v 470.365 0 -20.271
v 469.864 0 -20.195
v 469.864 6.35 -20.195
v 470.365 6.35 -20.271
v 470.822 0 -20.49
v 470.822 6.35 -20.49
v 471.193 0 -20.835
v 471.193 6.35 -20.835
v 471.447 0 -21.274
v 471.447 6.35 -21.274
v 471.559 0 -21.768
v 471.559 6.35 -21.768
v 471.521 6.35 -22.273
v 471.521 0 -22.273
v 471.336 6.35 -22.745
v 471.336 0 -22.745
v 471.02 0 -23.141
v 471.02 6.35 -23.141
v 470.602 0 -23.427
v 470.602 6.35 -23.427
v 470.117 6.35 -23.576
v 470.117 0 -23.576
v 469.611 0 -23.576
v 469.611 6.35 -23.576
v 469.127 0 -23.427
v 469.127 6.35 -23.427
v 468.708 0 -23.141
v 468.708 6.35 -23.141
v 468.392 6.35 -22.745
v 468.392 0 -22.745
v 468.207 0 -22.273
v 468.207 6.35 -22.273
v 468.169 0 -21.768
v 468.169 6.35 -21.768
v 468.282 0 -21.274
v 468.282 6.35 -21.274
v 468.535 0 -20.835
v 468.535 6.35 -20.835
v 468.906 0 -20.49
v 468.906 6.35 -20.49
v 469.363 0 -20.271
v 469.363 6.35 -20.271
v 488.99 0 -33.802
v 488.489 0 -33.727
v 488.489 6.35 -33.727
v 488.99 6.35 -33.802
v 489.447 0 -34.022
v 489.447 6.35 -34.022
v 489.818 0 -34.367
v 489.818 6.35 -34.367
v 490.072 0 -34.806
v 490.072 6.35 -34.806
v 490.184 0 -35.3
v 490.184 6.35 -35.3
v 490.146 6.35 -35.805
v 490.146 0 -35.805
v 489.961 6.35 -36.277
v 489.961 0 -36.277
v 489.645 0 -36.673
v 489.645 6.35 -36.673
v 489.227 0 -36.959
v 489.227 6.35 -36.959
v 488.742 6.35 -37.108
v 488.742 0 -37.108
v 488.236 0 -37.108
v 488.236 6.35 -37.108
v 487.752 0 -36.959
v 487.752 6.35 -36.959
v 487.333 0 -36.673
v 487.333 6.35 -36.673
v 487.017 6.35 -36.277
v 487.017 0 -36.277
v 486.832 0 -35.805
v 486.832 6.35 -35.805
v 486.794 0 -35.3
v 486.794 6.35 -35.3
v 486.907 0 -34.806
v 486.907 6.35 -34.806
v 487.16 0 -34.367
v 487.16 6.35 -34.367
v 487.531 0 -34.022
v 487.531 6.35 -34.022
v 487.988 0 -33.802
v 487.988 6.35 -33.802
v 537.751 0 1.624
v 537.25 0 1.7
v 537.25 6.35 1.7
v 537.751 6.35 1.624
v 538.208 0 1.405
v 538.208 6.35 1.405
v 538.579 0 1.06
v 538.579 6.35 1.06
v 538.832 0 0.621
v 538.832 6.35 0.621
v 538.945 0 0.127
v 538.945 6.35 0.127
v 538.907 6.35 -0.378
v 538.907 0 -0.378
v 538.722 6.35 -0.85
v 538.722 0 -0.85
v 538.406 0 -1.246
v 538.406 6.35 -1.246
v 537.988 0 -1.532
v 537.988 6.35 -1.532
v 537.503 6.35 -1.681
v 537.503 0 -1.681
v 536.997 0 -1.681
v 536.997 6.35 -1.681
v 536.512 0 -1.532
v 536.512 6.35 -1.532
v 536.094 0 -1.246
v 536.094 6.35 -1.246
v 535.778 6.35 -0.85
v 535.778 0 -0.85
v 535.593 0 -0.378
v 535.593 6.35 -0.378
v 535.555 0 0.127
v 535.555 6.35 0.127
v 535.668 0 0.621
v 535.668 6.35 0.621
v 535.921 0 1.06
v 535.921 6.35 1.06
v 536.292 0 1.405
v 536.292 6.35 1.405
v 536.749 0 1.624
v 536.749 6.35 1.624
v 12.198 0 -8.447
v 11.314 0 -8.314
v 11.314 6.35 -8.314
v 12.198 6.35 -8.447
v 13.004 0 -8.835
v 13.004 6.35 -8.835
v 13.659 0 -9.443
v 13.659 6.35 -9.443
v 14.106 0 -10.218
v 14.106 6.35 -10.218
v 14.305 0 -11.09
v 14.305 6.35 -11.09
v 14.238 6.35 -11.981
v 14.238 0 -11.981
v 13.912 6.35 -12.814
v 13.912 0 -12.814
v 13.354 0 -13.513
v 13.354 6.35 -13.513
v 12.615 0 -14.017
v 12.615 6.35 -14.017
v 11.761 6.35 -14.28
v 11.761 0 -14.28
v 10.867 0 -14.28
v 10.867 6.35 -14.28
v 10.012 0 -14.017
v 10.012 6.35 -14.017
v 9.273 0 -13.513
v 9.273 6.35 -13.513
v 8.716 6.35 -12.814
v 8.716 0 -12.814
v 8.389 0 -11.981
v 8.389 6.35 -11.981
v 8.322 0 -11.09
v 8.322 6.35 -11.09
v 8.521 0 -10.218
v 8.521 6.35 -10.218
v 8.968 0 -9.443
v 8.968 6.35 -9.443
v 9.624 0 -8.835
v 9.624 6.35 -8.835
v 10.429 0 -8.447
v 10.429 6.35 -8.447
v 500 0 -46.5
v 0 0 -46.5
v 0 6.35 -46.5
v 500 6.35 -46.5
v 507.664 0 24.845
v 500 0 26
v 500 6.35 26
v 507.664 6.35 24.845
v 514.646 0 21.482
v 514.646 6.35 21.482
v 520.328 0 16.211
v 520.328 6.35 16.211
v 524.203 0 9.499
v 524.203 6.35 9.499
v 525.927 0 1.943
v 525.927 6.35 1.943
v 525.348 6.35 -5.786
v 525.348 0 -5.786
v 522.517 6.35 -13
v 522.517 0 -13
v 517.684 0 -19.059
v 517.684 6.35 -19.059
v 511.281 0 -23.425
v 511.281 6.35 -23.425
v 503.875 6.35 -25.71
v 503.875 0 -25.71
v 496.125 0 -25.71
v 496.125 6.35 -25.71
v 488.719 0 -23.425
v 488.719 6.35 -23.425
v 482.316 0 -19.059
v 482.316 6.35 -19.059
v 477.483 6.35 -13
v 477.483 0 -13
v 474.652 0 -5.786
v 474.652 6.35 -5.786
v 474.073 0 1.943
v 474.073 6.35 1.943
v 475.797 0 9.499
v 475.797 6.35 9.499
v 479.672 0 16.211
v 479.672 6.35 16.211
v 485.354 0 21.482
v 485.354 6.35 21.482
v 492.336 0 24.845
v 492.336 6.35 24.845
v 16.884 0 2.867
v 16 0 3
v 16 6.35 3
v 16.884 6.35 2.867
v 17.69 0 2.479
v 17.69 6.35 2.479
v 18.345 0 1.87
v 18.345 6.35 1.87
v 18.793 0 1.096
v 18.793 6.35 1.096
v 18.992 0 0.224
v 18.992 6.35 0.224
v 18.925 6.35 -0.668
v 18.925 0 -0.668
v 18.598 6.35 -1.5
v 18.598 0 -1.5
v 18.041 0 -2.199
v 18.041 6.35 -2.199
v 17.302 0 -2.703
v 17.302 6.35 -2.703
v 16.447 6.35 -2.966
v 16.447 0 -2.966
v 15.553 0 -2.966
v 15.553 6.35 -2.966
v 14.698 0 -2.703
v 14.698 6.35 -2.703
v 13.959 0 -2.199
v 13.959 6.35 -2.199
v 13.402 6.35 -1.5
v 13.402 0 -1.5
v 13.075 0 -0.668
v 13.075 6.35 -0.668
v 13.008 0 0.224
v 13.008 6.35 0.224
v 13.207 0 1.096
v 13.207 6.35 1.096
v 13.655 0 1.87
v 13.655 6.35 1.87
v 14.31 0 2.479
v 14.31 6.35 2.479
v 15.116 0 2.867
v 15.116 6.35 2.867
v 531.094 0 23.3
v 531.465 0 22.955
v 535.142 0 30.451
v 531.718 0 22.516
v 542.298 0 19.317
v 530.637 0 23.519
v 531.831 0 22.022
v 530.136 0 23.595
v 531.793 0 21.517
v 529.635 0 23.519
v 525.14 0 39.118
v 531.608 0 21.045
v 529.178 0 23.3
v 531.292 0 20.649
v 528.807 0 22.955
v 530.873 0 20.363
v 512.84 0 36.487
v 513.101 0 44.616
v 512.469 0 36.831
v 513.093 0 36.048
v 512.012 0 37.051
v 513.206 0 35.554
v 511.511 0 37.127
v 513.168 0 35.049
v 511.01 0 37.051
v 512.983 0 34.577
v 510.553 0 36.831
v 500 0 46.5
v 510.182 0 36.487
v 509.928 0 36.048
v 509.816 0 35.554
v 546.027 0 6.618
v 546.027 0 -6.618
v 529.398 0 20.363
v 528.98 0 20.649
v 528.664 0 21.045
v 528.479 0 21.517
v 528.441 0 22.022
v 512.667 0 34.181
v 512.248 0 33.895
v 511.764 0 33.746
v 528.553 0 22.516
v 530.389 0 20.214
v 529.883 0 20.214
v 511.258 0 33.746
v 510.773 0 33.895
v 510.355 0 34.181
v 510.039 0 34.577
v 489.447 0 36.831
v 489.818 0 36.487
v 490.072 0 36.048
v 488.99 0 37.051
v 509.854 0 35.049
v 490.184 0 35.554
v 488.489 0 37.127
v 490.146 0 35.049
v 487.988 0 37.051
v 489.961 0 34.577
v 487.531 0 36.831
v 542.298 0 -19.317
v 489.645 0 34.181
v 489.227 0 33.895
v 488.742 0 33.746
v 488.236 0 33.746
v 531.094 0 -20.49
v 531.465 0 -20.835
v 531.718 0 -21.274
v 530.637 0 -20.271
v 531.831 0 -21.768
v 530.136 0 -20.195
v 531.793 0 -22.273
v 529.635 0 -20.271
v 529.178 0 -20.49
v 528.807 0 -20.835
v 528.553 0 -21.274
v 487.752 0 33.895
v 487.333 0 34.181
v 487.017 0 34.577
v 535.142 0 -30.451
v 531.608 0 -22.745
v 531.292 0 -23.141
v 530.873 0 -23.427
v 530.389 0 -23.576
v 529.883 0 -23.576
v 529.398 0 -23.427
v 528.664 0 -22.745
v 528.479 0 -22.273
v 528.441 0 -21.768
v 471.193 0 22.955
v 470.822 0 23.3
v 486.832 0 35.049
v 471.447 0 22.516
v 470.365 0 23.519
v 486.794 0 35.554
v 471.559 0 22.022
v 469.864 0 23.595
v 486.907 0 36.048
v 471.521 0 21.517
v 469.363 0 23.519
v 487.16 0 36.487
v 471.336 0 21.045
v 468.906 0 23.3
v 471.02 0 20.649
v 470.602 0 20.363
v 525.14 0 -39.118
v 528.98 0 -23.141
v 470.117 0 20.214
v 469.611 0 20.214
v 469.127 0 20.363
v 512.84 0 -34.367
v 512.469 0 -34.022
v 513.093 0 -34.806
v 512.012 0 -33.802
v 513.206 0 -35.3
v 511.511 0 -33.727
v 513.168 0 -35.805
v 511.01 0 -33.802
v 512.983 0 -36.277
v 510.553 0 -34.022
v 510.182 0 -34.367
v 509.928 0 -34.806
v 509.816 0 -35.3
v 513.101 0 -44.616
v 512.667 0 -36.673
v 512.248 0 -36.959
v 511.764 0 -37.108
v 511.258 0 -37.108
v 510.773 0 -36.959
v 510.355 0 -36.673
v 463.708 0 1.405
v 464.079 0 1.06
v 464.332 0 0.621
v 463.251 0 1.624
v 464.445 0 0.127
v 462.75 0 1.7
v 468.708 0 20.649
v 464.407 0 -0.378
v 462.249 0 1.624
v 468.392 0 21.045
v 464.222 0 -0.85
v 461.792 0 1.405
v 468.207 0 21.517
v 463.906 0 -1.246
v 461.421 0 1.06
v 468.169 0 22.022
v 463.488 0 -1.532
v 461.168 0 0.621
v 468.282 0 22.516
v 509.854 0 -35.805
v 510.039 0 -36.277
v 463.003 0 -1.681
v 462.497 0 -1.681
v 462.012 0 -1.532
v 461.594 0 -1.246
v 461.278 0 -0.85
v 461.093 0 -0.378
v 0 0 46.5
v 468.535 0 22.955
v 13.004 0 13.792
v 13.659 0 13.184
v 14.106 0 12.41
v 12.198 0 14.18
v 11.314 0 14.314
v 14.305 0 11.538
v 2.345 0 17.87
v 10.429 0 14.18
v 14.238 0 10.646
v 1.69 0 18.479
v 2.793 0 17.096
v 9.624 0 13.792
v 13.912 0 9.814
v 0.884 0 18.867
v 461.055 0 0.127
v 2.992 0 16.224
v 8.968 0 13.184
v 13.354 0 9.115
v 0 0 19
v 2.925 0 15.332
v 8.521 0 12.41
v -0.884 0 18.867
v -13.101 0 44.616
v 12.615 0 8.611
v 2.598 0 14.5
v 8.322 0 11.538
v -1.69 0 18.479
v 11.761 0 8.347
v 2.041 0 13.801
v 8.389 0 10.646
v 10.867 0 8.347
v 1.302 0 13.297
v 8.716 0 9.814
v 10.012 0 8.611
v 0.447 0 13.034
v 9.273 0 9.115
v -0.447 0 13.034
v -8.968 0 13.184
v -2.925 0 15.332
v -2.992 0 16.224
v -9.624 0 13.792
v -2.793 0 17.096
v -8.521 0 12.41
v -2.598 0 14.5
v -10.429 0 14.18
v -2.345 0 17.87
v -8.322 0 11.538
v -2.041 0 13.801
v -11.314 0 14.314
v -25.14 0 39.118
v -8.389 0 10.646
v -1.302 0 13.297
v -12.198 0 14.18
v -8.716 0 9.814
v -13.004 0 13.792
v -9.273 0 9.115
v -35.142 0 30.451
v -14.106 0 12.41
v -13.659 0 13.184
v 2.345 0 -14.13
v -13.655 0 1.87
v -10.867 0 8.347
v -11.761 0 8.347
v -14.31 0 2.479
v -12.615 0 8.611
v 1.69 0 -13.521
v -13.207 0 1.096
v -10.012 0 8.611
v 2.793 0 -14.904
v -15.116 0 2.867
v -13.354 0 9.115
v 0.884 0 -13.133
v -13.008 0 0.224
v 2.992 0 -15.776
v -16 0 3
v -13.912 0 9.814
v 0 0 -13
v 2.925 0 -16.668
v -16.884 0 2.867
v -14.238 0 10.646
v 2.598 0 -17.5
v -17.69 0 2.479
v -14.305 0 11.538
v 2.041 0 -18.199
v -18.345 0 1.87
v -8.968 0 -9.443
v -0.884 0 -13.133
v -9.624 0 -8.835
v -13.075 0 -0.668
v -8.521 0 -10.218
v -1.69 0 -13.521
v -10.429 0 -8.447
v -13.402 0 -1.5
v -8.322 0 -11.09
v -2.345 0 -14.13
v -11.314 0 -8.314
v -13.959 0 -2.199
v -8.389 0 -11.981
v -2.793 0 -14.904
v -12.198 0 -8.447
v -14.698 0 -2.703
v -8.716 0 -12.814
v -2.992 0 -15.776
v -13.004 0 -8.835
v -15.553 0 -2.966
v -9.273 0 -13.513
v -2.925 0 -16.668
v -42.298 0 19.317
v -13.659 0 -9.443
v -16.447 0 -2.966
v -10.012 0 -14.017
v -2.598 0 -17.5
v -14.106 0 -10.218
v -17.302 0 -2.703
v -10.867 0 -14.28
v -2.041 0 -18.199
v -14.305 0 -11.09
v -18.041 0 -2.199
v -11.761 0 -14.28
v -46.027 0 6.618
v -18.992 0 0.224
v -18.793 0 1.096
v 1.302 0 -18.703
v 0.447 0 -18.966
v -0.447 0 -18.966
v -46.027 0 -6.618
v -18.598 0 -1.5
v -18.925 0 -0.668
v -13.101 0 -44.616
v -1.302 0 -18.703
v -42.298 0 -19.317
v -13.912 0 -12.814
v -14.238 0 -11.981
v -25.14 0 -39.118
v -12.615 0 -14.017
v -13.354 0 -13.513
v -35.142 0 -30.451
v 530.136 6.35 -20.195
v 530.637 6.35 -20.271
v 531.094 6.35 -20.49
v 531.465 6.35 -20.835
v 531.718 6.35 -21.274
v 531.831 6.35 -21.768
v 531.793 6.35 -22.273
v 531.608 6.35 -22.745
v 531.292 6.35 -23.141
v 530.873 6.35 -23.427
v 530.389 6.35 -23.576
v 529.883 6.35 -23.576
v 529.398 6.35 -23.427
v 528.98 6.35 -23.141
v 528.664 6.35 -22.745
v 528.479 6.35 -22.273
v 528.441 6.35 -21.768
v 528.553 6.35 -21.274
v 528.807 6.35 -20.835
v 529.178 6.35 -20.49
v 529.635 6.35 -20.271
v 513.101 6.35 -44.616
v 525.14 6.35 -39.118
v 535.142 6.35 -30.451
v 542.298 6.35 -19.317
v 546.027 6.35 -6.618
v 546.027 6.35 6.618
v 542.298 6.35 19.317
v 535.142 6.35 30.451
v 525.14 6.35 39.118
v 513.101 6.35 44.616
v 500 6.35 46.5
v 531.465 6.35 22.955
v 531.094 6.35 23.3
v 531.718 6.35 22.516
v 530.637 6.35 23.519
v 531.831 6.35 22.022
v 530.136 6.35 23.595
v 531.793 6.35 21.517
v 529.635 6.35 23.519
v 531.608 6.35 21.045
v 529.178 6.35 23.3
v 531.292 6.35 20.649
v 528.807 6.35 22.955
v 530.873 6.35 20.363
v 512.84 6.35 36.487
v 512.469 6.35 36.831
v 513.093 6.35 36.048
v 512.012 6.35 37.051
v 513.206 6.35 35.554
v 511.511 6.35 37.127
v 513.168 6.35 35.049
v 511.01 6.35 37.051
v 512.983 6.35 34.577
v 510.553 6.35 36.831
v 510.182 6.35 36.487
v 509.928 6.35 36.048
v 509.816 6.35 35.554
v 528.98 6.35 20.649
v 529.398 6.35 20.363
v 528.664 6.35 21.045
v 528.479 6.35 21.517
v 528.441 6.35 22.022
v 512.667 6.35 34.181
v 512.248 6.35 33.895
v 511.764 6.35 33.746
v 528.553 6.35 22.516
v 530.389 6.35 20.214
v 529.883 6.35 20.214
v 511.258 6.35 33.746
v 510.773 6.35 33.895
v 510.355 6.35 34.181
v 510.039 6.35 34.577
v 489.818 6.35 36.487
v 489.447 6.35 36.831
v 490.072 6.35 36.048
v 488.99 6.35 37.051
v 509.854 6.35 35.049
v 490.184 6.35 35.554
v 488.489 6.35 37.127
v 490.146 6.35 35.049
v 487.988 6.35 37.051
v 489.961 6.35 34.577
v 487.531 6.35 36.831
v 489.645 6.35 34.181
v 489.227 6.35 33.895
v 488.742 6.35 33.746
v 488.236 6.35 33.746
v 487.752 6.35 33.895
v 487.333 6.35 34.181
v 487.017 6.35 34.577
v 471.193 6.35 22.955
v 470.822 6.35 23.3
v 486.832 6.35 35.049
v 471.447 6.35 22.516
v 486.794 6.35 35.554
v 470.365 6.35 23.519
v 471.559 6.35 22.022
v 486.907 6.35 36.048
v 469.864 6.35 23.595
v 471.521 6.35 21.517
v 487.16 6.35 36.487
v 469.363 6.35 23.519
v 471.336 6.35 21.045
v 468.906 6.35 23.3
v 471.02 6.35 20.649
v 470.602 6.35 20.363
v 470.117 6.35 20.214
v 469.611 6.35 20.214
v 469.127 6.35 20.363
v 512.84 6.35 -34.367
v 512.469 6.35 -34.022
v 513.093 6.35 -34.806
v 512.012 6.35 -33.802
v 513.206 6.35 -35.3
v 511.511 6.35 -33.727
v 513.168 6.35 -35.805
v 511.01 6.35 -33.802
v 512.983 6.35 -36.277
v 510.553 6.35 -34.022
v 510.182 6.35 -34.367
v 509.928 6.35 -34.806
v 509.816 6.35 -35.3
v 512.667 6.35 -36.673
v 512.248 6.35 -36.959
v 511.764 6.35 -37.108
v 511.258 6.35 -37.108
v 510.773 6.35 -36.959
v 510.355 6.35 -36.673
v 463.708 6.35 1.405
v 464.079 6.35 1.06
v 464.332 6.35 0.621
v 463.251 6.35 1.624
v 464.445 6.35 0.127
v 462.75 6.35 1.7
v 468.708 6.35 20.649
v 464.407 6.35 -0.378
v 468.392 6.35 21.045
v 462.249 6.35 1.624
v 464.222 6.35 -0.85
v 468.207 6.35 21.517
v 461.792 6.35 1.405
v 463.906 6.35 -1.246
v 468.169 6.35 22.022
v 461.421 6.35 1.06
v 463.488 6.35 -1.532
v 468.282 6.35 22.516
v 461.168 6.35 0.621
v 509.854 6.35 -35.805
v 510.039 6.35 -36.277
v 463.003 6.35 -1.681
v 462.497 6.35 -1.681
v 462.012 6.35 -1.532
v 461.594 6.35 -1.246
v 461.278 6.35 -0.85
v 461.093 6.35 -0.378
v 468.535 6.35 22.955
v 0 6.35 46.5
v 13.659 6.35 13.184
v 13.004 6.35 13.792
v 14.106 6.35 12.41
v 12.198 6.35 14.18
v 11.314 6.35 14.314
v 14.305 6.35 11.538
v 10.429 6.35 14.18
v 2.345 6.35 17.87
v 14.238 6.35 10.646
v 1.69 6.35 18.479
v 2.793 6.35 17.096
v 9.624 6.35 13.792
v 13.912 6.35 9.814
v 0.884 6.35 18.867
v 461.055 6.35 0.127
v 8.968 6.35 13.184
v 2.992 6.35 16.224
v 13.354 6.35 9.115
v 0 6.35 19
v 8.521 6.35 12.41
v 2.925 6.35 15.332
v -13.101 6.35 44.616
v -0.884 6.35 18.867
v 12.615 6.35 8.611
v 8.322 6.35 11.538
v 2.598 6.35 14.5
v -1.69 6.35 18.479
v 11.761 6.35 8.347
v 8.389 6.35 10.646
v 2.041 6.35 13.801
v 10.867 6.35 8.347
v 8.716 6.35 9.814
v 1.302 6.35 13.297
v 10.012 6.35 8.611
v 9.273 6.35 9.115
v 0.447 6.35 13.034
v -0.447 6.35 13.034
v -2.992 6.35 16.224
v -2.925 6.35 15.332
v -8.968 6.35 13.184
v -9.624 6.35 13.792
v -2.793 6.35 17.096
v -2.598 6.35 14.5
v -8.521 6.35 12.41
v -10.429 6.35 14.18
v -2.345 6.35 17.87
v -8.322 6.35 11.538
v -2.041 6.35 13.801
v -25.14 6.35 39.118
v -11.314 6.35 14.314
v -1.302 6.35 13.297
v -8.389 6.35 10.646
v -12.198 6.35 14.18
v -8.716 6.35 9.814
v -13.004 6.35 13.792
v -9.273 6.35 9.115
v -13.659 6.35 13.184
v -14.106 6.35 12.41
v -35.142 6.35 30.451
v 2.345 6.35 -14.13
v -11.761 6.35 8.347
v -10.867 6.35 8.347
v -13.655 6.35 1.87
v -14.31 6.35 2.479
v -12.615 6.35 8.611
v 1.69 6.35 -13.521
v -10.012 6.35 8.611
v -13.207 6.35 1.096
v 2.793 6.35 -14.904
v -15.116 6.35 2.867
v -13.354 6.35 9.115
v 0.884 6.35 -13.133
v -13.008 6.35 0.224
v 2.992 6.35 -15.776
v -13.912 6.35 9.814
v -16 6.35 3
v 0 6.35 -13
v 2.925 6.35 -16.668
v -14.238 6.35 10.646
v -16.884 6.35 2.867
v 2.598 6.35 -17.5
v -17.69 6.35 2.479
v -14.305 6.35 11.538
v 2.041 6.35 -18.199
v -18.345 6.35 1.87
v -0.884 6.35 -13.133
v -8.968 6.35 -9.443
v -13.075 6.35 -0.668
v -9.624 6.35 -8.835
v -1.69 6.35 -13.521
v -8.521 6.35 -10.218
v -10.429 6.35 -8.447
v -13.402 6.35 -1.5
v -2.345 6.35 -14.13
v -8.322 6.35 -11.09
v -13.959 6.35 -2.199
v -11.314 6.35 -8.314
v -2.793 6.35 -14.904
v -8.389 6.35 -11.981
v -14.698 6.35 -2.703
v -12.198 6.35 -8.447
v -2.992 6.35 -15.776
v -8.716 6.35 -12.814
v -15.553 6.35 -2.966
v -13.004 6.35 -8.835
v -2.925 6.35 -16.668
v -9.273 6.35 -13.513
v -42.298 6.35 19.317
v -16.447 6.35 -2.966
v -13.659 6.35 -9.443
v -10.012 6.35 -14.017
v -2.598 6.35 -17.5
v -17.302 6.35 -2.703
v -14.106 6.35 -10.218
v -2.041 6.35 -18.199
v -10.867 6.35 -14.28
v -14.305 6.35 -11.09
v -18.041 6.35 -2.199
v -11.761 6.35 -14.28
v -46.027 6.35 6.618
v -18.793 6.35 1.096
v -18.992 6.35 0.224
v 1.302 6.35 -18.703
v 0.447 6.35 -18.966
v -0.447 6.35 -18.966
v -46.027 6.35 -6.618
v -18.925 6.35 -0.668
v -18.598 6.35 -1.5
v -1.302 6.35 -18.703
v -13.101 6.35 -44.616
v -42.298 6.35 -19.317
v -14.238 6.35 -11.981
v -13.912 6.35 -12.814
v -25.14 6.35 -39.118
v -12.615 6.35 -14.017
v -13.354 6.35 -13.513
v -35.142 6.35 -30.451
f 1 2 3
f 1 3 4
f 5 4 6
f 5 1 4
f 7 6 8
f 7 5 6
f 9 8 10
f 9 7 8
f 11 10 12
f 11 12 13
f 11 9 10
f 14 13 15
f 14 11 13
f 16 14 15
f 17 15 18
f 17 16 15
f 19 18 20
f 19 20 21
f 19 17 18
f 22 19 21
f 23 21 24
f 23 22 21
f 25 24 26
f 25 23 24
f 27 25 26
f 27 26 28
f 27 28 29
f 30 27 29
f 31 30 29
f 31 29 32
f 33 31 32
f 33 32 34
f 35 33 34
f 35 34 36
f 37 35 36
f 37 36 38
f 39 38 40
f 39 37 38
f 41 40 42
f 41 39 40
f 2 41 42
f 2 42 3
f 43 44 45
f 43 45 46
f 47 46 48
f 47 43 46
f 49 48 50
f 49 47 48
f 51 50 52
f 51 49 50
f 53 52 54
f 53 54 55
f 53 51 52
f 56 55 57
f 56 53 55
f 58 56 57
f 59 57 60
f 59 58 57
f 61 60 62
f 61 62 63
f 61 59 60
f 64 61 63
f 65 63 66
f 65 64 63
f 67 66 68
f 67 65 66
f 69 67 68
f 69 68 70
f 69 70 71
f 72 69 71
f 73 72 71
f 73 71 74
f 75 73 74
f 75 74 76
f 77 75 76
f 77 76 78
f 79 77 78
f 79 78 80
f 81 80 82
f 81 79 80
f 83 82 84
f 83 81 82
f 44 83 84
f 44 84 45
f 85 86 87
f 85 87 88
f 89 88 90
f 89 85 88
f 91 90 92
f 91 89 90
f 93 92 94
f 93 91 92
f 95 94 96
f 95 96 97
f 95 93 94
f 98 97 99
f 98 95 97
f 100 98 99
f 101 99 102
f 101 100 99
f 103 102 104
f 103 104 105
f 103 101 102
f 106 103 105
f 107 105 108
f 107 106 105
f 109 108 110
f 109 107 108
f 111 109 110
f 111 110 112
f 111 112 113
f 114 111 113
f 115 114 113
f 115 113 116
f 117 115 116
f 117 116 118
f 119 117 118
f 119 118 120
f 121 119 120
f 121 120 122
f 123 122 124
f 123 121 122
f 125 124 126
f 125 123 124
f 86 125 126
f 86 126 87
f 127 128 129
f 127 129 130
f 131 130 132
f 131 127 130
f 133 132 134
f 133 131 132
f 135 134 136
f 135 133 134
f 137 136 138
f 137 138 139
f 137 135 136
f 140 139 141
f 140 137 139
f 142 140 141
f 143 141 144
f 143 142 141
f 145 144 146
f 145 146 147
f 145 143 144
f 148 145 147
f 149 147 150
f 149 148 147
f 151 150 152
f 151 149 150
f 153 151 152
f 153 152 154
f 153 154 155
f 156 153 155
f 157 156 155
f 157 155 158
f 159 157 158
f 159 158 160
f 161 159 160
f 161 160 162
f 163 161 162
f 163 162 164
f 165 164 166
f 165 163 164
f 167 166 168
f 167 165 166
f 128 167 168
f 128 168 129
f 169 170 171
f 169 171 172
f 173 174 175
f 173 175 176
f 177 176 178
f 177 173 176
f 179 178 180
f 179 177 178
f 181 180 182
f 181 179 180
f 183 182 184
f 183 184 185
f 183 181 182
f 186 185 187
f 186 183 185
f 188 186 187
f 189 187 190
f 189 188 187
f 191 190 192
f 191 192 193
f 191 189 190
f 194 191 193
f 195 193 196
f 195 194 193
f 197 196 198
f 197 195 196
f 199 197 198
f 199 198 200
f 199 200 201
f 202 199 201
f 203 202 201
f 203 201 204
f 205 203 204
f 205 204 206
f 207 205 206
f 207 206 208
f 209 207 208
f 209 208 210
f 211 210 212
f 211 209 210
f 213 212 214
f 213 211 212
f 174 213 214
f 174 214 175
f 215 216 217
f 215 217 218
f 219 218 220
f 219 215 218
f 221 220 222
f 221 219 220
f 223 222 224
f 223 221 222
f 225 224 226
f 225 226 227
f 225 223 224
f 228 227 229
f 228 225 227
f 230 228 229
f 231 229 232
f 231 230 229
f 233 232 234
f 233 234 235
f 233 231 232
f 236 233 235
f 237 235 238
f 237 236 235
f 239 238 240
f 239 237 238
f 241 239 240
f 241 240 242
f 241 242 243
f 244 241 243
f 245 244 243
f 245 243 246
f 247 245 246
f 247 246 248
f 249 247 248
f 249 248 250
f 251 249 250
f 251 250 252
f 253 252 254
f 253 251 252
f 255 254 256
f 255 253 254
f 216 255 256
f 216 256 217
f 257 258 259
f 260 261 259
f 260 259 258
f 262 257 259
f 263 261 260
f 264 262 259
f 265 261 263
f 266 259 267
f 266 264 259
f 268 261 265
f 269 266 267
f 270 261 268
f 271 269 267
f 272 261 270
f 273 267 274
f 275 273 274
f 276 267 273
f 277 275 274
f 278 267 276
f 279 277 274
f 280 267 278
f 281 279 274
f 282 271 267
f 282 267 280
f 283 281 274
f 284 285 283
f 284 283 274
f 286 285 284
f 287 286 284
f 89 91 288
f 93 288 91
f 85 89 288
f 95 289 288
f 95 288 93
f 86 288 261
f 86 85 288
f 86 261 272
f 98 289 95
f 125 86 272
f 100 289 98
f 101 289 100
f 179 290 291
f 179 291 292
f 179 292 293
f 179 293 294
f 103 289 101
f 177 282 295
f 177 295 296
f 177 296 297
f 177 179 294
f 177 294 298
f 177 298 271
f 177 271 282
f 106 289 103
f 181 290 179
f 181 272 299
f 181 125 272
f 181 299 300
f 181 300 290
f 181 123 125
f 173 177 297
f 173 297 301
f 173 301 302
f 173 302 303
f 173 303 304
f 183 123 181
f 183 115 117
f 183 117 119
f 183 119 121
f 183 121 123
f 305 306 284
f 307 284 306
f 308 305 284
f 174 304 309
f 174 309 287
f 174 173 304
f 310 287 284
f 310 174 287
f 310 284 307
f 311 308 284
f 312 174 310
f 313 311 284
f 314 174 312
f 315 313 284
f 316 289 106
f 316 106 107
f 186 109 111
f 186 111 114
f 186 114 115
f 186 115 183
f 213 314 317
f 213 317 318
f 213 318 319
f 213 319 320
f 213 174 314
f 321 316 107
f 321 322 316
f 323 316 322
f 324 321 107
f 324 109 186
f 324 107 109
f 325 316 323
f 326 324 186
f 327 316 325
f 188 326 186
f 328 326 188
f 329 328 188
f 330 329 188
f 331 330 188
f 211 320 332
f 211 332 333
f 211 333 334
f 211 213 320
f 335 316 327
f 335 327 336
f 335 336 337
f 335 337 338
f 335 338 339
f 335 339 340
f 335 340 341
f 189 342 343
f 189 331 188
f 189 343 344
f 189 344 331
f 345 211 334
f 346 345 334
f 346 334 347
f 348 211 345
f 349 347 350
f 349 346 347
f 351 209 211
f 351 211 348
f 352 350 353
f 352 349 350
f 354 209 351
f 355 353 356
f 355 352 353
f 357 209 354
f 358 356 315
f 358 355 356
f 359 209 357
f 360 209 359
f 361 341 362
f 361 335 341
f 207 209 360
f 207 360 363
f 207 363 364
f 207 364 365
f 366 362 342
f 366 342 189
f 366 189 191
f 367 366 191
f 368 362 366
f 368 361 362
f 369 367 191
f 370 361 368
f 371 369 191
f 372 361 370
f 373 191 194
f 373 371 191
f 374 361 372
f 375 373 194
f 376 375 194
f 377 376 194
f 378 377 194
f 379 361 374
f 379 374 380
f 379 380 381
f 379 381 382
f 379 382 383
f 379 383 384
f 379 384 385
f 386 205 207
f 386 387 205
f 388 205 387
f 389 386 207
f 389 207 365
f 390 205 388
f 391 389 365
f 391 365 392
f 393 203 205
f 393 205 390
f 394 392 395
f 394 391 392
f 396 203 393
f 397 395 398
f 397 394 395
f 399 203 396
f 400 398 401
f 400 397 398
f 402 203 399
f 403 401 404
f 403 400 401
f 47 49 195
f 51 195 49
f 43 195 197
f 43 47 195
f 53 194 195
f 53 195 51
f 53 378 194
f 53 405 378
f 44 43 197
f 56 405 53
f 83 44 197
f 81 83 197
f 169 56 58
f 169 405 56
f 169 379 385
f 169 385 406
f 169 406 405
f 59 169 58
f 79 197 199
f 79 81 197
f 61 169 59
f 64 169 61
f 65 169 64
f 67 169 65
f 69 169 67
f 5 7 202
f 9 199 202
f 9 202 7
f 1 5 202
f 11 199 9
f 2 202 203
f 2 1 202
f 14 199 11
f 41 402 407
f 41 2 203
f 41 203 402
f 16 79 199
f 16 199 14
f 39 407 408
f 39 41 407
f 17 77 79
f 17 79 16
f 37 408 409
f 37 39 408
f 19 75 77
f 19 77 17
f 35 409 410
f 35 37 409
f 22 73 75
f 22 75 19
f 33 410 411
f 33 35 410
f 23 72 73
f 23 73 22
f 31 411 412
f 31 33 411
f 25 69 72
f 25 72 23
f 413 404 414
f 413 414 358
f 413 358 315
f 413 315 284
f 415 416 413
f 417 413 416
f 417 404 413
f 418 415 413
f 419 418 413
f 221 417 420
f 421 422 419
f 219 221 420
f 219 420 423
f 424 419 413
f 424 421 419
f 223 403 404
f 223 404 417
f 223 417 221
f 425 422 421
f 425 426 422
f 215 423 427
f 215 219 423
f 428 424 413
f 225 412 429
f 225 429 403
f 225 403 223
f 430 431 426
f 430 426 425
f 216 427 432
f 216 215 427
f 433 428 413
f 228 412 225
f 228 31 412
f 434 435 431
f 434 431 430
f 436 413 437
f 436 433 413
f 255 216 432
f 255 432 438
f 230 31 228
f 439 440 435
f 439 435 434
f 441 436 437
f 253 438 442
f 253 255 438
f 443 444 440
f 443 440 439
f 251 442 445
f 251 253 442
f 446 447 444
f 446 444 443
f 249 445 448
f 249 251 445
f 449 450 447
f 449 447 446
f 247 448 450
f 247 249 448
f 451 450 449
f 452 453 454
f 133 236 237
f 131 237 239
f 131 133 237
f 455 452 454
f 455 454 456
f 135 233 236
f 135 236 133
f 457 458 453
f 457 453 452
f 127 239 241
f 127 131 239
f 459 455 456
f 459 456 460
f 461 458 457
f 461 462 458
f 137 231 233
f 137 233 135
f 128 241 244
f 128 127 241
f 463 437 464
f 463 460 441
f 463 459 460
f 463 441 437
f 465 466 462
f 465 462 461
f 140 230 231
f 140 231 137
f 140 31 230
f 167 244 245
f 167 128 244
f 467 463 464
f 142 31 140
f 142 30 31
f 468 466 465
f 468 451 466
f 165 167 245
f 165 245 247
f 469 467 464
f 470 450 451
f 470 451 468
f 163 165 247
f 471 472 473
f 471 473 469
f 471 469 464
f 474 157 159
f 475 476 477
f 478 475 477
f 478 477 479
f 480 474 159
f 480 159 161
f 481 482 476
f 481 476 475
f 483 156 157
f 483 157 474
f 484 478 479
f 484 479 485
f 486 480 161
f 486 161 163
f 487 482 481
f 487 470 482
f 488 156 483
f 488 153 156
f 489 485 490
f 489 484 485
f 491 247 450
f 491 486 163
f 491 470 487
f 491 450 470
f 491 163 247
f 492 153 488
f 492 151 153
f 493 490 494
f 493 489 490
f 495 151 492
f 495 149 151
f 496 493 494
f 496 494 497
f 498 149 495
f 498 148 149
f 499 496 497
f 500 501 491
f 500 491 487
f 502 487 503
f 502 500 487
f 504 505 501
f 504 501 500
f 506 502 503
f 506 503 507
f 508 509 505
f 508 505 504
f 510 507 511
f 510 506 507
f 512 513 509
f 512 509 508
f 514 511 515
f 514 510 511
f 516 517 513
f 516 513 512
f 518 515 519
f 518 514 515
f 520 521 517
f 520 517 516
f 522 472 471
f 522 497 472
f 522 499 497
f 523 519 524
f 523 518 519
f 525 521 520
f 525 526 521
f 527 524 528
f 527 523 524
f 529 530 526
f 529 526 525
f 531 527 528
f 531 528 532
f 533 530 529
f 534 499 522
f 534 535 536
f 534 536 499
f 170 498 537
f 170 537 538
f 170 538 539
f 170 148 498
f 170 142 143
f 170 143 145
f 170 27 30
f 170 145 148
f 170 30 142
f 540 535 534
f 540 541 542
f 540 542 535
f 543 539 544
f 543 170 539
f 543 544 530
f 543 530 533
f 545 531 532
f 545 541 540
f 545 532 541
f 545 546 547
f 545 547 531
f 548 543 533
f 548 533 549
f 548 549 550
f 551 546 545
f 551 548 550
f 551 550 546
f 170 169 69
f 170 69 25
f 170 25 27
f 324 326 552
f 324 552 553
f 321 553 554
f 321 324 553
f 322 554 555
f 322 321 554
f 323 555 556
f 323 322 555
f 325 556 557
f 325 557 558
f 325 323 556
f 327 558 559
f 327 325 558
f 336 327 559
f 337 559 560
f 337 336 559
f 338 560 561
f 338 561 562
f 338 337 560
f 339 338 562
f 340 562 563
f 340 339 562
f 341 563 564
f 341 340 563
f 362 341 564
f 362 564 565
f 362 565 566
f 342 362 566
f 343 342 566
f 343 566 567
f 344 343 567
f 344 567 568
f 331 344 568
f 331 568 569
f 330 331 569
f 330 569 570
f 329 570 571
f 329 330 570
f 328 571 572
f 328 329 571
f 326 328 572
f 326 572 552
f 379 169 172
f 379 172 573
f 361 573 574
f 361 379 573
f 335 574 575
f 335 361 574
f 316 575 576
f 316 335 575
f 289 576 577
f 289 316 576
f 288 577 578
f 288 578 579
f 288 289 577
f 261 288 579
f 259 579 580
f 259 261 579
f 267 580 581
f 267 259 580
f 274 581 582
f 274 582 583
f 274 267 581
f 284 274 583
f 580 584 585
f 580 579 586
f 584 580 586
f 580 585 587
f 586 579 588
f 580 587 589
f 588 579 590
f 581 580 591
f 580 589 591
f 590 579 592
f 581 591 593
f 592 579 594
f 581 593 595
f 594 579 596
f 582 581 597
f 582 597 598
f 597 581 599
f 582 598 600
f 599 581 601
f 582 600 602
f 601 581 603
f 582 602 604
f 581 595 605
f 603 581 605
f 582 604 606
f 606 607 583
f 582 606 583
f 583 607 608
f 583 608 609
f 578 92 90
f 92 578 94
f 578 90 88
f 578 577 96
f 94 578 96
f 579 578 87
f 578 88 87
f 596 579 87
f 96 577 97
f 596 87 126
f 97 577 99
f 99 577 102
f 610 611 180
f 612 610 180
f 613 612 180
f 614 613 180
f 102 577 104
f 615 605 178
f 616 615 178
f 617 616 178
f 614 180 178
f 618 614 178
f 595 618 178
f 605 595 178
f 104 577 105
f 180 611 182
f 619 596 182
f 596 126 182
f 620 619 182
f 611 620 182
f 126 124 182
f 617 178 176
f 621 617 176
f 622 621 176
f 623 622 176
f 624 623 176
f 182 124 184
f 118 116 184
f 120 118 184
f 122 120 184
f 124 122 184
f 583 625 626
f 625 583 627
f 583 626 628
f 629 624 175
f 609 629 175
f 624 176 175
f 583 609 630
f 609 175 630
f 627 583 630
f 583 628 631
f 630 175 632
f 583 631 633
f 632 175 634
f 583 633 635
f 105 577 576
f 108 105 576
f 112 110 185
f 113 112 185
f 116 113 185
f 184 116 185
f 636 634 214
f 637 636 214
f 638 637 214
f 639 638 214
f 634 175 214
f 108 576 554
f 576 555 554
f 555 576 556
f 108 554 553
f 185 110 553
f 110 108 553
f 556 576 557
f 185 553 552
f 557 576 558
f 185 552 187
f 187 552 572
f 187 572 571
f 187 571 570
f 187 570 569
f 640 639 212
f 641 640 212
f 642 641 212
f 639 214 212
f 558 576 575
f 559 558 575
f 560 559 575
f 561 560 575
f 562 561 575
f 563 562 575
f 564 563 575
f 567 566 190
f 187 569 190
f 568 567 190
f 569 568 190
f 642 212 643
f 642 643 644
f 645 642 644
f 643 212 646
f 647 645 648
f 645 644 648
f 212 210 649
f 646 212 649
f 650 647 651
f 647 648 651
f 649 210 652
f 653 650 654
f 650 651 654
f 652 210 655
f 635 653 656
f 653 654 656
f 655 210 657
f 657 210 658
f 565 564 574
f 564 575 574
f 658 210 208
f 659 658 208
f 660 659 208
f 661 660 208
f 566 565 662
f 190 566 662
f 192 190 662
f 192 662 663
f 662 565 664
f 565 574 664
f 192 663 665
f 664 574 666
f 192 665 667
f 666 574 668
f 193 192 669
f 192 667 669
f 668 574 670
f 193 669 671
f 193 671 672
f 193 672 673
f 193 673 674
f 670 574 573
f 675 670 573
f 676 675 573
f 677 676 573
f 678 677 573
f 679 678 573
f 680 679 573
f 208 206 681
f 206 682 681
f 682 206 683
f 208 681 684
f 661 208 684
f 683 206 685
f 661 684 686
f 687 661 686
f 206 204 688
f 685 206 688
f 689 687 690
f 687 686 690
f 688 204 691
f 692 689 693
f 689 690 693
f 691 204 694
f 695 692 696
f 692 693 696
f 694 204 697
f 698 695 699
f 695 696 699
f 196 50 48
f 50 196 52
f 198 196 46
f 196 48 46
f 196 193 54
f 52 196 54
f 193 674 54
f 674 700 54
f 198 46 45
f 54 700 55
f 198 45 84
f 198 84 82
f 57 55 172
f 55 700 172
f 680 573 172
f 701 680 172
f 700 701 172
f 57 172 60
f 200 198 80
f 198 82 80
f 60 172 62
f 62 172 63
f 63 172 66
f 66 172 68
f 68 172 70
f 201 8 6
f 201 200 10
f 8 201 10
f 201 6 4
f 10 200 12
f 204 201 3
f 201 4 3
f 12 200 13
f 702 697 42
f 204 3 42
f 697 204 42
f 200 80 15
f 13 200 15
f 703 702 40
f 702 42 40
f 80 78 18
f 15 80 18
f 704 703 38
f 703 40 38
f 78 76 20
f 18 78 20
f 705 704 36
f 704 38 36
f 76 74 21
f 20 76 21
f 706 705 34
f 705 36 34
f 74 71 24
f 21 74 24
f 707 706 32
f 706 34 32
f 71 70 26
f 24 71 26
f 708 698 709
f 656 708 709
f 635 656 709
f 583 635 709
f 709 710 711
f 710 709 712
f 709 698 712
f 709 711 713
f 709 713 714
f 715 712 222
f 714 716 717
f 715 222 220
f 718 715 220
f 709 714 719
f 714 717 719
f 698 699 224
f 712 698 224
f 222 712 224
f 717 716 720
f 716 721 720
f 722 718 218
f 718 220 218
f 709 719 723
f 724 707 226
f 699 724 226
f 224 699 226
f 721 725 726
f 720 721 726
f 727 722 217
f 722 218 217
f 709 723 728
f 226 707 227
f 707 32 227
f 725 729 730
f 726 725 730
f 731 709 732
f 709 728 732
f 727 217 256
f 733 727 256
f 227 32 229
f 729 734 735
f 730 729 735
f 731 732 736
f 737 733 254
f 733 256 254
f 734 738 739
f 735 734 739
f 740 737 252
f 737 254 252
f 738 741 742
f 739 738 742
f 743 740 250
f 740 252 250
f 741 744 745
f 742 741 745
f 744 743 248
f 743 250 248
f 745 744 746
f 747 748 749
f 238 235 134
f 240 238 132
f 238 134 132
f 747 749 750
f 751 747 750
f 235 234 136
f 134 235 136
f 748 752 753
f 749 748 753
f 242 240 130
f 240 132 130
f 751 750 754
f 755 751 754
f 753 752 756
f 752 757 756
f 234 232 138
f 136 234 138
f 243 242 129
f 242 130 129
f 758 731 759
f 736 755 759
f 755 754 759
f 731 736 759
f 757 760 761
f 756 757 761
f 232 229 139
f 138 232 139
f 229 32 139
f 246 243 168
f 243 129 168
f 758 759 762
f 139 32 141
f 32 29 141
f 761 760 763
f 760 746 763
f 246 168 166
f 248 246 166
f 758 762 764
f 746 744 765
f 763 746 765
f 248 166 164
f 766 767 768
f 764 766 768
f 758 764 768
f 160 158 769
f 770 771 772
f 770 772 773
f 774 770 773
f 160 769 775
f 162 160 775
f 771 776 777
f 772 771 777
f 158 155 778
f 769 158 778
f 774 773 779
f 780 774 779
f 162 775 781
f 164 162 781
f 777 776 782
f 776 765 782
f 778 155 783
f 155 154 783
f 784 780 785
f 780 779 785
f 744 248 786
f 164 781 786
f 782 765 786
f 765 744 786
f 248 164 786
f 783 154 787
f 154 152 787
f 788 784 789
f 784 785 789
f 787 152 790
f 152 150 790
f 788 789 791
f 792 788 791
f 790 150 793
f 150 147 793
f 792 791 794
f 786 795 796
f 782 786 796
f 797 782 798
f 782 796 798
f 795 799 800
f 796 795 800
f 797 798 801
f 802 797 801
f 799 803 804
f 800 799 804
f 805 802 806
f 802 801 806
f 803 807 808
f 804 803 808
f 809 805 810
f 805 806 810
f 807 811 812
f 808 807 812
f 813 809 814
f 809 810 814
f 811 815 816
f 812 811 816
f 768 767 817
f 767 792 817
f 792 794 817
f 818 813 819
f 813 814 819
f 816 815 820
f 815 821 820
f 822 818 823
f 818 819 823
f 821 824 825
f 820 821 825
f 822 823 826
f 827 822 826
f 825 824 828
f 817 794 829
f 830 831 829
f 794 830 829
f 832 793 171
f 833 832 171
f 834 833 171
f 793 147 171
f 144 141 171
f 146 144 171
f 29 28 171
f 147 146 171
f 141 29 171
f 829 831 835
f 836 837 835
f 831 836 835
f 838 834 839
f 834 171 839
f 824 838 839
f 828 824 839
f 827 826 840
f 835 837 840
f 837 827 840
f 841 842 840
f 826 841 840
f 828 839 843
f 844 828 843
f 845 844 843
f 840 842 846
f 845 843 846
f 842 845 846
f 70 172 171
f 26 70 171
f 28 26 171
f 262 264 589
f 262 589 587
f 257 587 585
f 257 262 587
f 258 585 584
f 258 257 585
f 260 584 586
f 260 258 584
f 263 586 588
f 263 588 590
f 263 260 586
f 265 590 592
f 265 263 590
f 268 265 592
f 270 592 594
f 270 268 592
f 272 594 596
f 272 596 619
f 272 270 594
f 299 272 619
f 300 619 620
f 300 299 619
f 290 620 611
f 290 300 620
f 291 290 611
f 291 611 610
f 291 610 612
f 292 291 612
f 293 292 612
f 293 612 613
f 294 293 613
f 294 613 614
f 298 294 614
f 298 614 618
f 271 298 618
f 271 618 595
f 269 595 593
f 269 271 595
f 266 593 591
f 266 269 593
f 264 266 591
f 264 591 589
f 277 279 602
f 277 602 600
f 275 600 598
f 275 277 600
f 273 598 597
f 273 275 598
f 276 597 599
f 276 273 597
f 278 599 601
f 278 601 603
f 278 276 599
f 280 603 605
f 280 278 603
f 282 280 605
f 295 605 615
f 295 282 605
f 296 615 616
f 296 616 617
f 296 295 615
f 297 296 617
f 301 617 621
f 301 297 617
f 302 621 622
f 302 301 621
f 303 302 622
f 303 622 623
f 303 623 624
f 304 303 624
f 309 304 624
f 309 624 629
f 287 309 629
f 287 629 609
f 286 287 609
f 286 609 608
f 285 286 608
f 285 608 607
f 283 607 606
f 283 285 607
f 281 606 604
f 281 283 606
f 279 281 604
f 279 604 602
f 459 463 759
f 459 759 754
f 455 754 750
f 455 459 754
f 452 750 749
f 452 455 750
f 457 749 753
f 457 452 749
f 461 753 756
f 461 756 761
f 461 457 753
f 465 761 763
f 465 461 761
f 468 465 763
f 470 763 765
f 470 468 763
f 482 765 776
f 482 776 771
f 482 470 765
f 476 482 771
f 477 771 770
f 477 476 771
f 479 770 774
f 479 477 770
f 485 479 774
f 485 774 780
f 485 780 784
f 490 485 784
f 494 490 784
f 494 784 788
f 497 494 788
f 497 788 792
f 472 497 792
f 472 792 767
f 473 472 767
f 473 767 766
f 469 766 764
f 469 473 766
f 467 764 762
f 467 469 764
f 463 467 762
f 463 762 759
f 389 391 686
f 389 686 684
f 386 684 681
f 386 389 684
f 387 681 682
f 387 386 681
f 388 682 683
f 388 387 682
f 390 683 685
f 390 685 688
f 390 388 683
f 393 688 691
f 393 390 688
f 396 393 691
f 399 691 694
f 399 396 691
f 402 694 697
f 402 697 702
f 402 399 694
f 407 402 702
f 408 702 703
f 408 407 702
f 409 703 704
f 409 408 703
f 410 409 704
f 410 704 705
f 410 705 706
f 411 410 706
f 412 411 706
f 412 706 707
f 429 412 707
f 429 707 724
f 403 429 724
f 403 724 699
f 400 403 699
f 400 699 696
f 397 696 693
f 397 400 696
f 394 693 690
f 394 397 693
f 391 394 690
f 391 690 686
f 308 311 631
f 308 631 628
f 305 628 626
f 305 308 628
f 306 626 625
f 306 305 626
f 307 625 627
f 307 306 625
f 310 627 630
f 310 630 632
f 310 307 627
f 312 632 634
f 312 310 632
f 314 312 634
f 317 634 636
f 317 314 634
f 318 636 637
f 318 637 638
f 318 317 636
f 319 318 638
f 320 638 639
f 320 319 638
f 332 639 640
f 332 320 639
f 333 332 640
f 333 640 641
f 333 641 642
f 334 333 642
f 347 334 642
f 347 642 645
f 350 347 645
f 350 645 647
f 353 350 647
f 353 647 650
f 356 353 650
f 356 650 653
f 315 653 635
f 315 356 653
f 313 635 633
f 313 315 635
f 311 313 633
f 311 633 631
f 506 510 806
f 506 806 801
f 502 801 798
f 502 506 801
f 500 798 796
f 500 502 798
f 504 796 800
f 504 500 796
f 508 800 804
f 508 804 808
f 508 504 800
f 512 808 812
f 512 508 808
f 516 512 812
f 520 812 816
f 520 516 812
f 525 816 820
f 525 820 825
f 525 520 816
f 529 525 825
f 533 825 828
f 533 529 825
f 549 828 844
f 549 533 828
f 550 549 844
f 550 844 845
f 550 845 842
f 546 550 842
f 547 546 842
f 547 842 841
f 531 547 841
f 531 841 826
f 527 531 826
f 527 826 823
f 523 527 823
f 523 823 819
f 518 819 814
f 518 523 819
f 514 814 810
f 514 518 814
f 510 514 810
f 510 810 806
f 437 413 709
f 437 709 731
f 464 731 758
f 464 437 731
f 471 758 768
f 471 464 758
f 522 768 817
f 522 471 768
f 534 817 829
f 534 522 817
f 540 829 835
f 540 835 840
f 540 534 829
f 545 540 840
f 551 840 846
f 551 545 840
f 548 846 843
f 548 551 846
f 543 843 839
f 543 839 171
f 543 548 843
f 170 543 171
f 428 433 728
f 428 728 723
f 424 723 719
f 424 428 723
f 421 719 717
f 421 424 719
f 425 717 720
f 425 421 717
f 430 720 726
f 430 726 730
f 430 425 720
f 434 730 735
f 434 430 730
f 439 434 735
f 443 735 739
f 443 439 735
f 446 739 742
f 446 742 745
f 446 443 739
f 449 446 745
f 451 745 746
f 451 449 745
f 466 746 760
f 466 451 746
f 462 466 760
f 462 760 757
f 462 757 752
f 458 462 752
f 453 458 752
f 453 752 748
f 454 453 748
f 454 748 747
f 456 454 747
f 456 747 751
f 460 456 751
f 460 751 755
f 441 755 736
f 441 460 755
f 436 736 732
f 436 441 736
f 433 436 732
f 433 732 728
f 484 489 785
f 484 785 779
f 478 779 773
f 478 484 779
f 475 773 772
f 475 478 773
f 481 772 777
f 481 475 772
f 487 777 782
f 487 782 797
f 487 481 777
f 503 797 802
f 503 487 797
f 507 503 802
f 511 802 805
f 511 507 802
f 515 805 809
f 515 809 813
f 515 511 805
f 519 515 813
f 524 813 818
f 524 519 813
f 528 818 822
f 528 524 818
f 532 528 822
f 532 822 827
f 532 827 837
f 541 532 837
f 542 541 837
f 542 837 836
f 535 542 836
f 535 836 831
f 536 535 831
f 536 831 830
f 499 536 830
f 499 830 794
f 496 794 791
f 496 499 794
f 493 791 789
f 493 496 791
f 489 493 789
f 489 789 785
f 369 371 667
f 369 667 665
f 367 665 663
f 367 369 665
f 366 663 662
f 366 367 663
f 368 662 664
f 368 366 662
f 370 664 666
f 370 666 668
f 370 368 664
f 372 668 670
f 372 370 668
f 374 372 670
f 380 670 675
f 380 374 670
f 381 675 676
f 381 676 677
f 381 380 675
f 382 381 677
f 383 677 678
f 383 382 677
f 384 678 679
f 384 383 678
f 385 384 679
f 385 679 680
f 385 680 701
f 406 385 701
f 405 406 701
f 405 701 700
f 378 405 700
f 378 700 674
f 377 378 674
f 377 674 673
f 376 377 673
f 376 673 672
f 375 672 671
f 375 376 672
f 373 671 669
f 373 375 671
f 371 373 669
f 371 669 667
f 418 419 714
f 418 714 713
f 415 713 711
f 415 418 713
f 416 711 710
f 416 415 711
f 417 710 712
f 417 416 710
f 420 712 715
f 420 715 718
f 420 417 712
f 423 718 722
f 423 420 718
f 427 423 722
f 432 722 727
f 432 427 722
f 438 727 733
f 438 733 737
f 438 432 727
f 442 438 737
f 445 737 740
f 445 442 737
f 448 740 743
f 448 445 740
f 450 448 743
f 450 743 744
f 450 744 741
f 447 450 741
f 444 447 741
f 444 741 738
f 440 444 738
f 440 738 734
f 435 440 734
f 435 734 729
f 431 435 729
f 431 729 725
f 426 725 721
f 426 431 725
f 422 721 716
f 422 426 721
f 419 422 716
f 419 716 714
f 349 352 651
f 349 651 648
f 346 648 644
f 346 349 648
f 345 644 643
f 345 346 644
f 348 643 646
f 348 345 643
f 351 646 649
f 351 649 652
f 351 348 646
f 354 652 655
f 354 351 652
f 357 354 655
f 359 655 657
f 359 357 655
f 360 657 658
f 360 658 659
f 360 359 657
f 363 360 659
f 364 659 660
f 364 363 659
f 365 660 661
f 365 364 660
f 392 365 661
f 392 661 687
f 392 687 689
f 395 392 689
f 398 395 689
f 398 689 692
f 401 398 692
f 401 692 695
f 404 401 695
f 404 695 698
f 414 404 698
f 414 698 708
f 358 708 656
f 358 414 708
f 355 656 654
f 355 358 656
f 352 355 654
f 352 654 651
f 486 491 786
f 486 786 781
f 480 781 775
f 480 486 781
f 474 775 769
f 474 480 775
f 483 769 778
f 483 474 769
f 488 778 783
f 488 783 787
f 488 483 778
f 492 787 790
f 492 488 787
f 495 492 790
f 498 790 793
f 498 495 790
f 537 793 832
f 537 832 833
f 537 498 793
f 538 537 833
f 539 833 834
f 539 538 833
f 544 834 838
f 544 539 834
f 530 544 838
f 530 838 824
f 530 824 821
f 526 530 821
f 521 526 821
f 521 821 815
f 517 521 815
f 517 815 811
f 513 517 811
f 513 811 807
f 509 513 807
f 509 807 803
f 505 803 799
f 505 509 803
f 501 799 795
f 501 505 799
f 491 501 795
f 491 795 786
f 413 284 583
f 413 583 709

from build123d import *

# Parameters (mm, degrees)
SKETCH1_R           = 3
SKETCH1_R_2         = 1.7
SKETCH1_R_3         = 26
BOSS_EXTRUDE1_DEPTH = 6.35


with BuildPart() as part:
    # Sketch1 → Boss-Extrude1 (new body)
    with BuildSketch(Plane(origin=(0, 0, 0), x_dir=(1, 0, 0), z_dir=(0, 1, 0))):
        with BuildLine():
            Line((0, 46.5), (500, 46.5))
            ThreePointArc((500, 46.5), (546.5, 0), (500, -46.5))
            Line((500, -46.5), (0, -46.5))
            ThreePointArc((0, -46.5), (-46.5, 0), (0, 46.5))
        make_face()
        with Locations(Location((-16, 0, 0), (0, 0, 270))):
            Circle(SKETCH1_R, mode=Mode.SUBTRACT)
        with Locations(Location((-11.313708499, 11.313708499, 0), (0, 0, 270))):
            Circle(SKETCH1_R, mode=Mode.SUBTRACT)
        with Locations(Location((0, 16, 0), (0, 0, 270))):
            Circle(SKETCH1_R, mode=Mode.SUBTRACT)
        with Locations(Location((11.313708499, 11.313708499, 0), (0, 0, 270))):
            Circle(SKETCH1_R, mode=Mode.SUBTRACT)
        with Locations(Location((16, 0, 0), (0, 0, 270))):
            Circle(SKETCH1_R, mode=Mode.SUBTRACT)
        with Locations(Location((11.313708499, -11.313708499, 0), (0, 0, 270))):
            Circle(SKETCH1_R, mode=Mode.SUBTRACT)
        with Locations(Location((537.25, 0, 0), (0, 0, 270))):
            Circle(SKETCH1_R_2, mode=Mode.SUBTRACT)
        with Locations(Location((530.13588304, -21.895000648, 0), (0, 0, 270))):
            Circle(SKETCH1_R_2, mode=Mode.SUBTRACT)
        with Locations(Location((511.51088304, -35.426855232, 0), (0, 0, 270))):
            Circle(SKETCH1_R_2, mode=Mode.SUBTRACT)
        with Locations(Location((488.48911696, -35.426855232, 0), (0, 0, 270))):
            Circle(SKETCH1_R_2, mode=Mode.SUBTRACT)
        with Locations(Location((469.86411696, -21.895000648, 0), (0, 0, 270))):
            Circle(SKETCH1_R_2, mode=Mode.SUBTRACT)
        with Locations(Location((462.75, 0, 0), (0, 0, 270))):
            Circle(SKETCH1_R_2, mode=Mode.SUBTRACT)
        with Locations(Location((469.86411696, 21.895000648, 0), (0, 0, 270))):
            Circle(SKETCH1_R_2, mode=Mode.SUBTRACT)
        with Locations(Location((488.48911696, 35.426855232, 0), (0, 0, 270))):
            Circle(SKETCH1_R_2, mode=Mode.SUBTRACT)
        with Locations(Location((511.51088304, 35.426855232, 0), (0, 0, 270))):
            Circle(SKETCH1_R_2, mode=Mode.SUBTRACT)
        with Locations(Location((530.13588304, 21.895000648, 0), (0, 0, 270))):
            Circle(SKETCH1_R_2, mode=Mode.SUBTRACT)
        with Locations(Location((500, 0, 0), (0, 0, 270))):
            Circle(SKETCH1_R_3, mode=Mode.SUBTRACT)
        with Locations(Location((0, -16, 0), (0, 0, 270))):
            Circle(SKETCH1_R, mode=Mode.SUBTRACT)
        with Locations(Location((-11.313708499, -11.313708499, 0), (0, 0, 270))):
            Circle(SKETCH1_R, mode=Mode.SUBTRACT)
    extrude(amount=BOSS_EXTRUDE1_DEPTH)


solid = part.part
